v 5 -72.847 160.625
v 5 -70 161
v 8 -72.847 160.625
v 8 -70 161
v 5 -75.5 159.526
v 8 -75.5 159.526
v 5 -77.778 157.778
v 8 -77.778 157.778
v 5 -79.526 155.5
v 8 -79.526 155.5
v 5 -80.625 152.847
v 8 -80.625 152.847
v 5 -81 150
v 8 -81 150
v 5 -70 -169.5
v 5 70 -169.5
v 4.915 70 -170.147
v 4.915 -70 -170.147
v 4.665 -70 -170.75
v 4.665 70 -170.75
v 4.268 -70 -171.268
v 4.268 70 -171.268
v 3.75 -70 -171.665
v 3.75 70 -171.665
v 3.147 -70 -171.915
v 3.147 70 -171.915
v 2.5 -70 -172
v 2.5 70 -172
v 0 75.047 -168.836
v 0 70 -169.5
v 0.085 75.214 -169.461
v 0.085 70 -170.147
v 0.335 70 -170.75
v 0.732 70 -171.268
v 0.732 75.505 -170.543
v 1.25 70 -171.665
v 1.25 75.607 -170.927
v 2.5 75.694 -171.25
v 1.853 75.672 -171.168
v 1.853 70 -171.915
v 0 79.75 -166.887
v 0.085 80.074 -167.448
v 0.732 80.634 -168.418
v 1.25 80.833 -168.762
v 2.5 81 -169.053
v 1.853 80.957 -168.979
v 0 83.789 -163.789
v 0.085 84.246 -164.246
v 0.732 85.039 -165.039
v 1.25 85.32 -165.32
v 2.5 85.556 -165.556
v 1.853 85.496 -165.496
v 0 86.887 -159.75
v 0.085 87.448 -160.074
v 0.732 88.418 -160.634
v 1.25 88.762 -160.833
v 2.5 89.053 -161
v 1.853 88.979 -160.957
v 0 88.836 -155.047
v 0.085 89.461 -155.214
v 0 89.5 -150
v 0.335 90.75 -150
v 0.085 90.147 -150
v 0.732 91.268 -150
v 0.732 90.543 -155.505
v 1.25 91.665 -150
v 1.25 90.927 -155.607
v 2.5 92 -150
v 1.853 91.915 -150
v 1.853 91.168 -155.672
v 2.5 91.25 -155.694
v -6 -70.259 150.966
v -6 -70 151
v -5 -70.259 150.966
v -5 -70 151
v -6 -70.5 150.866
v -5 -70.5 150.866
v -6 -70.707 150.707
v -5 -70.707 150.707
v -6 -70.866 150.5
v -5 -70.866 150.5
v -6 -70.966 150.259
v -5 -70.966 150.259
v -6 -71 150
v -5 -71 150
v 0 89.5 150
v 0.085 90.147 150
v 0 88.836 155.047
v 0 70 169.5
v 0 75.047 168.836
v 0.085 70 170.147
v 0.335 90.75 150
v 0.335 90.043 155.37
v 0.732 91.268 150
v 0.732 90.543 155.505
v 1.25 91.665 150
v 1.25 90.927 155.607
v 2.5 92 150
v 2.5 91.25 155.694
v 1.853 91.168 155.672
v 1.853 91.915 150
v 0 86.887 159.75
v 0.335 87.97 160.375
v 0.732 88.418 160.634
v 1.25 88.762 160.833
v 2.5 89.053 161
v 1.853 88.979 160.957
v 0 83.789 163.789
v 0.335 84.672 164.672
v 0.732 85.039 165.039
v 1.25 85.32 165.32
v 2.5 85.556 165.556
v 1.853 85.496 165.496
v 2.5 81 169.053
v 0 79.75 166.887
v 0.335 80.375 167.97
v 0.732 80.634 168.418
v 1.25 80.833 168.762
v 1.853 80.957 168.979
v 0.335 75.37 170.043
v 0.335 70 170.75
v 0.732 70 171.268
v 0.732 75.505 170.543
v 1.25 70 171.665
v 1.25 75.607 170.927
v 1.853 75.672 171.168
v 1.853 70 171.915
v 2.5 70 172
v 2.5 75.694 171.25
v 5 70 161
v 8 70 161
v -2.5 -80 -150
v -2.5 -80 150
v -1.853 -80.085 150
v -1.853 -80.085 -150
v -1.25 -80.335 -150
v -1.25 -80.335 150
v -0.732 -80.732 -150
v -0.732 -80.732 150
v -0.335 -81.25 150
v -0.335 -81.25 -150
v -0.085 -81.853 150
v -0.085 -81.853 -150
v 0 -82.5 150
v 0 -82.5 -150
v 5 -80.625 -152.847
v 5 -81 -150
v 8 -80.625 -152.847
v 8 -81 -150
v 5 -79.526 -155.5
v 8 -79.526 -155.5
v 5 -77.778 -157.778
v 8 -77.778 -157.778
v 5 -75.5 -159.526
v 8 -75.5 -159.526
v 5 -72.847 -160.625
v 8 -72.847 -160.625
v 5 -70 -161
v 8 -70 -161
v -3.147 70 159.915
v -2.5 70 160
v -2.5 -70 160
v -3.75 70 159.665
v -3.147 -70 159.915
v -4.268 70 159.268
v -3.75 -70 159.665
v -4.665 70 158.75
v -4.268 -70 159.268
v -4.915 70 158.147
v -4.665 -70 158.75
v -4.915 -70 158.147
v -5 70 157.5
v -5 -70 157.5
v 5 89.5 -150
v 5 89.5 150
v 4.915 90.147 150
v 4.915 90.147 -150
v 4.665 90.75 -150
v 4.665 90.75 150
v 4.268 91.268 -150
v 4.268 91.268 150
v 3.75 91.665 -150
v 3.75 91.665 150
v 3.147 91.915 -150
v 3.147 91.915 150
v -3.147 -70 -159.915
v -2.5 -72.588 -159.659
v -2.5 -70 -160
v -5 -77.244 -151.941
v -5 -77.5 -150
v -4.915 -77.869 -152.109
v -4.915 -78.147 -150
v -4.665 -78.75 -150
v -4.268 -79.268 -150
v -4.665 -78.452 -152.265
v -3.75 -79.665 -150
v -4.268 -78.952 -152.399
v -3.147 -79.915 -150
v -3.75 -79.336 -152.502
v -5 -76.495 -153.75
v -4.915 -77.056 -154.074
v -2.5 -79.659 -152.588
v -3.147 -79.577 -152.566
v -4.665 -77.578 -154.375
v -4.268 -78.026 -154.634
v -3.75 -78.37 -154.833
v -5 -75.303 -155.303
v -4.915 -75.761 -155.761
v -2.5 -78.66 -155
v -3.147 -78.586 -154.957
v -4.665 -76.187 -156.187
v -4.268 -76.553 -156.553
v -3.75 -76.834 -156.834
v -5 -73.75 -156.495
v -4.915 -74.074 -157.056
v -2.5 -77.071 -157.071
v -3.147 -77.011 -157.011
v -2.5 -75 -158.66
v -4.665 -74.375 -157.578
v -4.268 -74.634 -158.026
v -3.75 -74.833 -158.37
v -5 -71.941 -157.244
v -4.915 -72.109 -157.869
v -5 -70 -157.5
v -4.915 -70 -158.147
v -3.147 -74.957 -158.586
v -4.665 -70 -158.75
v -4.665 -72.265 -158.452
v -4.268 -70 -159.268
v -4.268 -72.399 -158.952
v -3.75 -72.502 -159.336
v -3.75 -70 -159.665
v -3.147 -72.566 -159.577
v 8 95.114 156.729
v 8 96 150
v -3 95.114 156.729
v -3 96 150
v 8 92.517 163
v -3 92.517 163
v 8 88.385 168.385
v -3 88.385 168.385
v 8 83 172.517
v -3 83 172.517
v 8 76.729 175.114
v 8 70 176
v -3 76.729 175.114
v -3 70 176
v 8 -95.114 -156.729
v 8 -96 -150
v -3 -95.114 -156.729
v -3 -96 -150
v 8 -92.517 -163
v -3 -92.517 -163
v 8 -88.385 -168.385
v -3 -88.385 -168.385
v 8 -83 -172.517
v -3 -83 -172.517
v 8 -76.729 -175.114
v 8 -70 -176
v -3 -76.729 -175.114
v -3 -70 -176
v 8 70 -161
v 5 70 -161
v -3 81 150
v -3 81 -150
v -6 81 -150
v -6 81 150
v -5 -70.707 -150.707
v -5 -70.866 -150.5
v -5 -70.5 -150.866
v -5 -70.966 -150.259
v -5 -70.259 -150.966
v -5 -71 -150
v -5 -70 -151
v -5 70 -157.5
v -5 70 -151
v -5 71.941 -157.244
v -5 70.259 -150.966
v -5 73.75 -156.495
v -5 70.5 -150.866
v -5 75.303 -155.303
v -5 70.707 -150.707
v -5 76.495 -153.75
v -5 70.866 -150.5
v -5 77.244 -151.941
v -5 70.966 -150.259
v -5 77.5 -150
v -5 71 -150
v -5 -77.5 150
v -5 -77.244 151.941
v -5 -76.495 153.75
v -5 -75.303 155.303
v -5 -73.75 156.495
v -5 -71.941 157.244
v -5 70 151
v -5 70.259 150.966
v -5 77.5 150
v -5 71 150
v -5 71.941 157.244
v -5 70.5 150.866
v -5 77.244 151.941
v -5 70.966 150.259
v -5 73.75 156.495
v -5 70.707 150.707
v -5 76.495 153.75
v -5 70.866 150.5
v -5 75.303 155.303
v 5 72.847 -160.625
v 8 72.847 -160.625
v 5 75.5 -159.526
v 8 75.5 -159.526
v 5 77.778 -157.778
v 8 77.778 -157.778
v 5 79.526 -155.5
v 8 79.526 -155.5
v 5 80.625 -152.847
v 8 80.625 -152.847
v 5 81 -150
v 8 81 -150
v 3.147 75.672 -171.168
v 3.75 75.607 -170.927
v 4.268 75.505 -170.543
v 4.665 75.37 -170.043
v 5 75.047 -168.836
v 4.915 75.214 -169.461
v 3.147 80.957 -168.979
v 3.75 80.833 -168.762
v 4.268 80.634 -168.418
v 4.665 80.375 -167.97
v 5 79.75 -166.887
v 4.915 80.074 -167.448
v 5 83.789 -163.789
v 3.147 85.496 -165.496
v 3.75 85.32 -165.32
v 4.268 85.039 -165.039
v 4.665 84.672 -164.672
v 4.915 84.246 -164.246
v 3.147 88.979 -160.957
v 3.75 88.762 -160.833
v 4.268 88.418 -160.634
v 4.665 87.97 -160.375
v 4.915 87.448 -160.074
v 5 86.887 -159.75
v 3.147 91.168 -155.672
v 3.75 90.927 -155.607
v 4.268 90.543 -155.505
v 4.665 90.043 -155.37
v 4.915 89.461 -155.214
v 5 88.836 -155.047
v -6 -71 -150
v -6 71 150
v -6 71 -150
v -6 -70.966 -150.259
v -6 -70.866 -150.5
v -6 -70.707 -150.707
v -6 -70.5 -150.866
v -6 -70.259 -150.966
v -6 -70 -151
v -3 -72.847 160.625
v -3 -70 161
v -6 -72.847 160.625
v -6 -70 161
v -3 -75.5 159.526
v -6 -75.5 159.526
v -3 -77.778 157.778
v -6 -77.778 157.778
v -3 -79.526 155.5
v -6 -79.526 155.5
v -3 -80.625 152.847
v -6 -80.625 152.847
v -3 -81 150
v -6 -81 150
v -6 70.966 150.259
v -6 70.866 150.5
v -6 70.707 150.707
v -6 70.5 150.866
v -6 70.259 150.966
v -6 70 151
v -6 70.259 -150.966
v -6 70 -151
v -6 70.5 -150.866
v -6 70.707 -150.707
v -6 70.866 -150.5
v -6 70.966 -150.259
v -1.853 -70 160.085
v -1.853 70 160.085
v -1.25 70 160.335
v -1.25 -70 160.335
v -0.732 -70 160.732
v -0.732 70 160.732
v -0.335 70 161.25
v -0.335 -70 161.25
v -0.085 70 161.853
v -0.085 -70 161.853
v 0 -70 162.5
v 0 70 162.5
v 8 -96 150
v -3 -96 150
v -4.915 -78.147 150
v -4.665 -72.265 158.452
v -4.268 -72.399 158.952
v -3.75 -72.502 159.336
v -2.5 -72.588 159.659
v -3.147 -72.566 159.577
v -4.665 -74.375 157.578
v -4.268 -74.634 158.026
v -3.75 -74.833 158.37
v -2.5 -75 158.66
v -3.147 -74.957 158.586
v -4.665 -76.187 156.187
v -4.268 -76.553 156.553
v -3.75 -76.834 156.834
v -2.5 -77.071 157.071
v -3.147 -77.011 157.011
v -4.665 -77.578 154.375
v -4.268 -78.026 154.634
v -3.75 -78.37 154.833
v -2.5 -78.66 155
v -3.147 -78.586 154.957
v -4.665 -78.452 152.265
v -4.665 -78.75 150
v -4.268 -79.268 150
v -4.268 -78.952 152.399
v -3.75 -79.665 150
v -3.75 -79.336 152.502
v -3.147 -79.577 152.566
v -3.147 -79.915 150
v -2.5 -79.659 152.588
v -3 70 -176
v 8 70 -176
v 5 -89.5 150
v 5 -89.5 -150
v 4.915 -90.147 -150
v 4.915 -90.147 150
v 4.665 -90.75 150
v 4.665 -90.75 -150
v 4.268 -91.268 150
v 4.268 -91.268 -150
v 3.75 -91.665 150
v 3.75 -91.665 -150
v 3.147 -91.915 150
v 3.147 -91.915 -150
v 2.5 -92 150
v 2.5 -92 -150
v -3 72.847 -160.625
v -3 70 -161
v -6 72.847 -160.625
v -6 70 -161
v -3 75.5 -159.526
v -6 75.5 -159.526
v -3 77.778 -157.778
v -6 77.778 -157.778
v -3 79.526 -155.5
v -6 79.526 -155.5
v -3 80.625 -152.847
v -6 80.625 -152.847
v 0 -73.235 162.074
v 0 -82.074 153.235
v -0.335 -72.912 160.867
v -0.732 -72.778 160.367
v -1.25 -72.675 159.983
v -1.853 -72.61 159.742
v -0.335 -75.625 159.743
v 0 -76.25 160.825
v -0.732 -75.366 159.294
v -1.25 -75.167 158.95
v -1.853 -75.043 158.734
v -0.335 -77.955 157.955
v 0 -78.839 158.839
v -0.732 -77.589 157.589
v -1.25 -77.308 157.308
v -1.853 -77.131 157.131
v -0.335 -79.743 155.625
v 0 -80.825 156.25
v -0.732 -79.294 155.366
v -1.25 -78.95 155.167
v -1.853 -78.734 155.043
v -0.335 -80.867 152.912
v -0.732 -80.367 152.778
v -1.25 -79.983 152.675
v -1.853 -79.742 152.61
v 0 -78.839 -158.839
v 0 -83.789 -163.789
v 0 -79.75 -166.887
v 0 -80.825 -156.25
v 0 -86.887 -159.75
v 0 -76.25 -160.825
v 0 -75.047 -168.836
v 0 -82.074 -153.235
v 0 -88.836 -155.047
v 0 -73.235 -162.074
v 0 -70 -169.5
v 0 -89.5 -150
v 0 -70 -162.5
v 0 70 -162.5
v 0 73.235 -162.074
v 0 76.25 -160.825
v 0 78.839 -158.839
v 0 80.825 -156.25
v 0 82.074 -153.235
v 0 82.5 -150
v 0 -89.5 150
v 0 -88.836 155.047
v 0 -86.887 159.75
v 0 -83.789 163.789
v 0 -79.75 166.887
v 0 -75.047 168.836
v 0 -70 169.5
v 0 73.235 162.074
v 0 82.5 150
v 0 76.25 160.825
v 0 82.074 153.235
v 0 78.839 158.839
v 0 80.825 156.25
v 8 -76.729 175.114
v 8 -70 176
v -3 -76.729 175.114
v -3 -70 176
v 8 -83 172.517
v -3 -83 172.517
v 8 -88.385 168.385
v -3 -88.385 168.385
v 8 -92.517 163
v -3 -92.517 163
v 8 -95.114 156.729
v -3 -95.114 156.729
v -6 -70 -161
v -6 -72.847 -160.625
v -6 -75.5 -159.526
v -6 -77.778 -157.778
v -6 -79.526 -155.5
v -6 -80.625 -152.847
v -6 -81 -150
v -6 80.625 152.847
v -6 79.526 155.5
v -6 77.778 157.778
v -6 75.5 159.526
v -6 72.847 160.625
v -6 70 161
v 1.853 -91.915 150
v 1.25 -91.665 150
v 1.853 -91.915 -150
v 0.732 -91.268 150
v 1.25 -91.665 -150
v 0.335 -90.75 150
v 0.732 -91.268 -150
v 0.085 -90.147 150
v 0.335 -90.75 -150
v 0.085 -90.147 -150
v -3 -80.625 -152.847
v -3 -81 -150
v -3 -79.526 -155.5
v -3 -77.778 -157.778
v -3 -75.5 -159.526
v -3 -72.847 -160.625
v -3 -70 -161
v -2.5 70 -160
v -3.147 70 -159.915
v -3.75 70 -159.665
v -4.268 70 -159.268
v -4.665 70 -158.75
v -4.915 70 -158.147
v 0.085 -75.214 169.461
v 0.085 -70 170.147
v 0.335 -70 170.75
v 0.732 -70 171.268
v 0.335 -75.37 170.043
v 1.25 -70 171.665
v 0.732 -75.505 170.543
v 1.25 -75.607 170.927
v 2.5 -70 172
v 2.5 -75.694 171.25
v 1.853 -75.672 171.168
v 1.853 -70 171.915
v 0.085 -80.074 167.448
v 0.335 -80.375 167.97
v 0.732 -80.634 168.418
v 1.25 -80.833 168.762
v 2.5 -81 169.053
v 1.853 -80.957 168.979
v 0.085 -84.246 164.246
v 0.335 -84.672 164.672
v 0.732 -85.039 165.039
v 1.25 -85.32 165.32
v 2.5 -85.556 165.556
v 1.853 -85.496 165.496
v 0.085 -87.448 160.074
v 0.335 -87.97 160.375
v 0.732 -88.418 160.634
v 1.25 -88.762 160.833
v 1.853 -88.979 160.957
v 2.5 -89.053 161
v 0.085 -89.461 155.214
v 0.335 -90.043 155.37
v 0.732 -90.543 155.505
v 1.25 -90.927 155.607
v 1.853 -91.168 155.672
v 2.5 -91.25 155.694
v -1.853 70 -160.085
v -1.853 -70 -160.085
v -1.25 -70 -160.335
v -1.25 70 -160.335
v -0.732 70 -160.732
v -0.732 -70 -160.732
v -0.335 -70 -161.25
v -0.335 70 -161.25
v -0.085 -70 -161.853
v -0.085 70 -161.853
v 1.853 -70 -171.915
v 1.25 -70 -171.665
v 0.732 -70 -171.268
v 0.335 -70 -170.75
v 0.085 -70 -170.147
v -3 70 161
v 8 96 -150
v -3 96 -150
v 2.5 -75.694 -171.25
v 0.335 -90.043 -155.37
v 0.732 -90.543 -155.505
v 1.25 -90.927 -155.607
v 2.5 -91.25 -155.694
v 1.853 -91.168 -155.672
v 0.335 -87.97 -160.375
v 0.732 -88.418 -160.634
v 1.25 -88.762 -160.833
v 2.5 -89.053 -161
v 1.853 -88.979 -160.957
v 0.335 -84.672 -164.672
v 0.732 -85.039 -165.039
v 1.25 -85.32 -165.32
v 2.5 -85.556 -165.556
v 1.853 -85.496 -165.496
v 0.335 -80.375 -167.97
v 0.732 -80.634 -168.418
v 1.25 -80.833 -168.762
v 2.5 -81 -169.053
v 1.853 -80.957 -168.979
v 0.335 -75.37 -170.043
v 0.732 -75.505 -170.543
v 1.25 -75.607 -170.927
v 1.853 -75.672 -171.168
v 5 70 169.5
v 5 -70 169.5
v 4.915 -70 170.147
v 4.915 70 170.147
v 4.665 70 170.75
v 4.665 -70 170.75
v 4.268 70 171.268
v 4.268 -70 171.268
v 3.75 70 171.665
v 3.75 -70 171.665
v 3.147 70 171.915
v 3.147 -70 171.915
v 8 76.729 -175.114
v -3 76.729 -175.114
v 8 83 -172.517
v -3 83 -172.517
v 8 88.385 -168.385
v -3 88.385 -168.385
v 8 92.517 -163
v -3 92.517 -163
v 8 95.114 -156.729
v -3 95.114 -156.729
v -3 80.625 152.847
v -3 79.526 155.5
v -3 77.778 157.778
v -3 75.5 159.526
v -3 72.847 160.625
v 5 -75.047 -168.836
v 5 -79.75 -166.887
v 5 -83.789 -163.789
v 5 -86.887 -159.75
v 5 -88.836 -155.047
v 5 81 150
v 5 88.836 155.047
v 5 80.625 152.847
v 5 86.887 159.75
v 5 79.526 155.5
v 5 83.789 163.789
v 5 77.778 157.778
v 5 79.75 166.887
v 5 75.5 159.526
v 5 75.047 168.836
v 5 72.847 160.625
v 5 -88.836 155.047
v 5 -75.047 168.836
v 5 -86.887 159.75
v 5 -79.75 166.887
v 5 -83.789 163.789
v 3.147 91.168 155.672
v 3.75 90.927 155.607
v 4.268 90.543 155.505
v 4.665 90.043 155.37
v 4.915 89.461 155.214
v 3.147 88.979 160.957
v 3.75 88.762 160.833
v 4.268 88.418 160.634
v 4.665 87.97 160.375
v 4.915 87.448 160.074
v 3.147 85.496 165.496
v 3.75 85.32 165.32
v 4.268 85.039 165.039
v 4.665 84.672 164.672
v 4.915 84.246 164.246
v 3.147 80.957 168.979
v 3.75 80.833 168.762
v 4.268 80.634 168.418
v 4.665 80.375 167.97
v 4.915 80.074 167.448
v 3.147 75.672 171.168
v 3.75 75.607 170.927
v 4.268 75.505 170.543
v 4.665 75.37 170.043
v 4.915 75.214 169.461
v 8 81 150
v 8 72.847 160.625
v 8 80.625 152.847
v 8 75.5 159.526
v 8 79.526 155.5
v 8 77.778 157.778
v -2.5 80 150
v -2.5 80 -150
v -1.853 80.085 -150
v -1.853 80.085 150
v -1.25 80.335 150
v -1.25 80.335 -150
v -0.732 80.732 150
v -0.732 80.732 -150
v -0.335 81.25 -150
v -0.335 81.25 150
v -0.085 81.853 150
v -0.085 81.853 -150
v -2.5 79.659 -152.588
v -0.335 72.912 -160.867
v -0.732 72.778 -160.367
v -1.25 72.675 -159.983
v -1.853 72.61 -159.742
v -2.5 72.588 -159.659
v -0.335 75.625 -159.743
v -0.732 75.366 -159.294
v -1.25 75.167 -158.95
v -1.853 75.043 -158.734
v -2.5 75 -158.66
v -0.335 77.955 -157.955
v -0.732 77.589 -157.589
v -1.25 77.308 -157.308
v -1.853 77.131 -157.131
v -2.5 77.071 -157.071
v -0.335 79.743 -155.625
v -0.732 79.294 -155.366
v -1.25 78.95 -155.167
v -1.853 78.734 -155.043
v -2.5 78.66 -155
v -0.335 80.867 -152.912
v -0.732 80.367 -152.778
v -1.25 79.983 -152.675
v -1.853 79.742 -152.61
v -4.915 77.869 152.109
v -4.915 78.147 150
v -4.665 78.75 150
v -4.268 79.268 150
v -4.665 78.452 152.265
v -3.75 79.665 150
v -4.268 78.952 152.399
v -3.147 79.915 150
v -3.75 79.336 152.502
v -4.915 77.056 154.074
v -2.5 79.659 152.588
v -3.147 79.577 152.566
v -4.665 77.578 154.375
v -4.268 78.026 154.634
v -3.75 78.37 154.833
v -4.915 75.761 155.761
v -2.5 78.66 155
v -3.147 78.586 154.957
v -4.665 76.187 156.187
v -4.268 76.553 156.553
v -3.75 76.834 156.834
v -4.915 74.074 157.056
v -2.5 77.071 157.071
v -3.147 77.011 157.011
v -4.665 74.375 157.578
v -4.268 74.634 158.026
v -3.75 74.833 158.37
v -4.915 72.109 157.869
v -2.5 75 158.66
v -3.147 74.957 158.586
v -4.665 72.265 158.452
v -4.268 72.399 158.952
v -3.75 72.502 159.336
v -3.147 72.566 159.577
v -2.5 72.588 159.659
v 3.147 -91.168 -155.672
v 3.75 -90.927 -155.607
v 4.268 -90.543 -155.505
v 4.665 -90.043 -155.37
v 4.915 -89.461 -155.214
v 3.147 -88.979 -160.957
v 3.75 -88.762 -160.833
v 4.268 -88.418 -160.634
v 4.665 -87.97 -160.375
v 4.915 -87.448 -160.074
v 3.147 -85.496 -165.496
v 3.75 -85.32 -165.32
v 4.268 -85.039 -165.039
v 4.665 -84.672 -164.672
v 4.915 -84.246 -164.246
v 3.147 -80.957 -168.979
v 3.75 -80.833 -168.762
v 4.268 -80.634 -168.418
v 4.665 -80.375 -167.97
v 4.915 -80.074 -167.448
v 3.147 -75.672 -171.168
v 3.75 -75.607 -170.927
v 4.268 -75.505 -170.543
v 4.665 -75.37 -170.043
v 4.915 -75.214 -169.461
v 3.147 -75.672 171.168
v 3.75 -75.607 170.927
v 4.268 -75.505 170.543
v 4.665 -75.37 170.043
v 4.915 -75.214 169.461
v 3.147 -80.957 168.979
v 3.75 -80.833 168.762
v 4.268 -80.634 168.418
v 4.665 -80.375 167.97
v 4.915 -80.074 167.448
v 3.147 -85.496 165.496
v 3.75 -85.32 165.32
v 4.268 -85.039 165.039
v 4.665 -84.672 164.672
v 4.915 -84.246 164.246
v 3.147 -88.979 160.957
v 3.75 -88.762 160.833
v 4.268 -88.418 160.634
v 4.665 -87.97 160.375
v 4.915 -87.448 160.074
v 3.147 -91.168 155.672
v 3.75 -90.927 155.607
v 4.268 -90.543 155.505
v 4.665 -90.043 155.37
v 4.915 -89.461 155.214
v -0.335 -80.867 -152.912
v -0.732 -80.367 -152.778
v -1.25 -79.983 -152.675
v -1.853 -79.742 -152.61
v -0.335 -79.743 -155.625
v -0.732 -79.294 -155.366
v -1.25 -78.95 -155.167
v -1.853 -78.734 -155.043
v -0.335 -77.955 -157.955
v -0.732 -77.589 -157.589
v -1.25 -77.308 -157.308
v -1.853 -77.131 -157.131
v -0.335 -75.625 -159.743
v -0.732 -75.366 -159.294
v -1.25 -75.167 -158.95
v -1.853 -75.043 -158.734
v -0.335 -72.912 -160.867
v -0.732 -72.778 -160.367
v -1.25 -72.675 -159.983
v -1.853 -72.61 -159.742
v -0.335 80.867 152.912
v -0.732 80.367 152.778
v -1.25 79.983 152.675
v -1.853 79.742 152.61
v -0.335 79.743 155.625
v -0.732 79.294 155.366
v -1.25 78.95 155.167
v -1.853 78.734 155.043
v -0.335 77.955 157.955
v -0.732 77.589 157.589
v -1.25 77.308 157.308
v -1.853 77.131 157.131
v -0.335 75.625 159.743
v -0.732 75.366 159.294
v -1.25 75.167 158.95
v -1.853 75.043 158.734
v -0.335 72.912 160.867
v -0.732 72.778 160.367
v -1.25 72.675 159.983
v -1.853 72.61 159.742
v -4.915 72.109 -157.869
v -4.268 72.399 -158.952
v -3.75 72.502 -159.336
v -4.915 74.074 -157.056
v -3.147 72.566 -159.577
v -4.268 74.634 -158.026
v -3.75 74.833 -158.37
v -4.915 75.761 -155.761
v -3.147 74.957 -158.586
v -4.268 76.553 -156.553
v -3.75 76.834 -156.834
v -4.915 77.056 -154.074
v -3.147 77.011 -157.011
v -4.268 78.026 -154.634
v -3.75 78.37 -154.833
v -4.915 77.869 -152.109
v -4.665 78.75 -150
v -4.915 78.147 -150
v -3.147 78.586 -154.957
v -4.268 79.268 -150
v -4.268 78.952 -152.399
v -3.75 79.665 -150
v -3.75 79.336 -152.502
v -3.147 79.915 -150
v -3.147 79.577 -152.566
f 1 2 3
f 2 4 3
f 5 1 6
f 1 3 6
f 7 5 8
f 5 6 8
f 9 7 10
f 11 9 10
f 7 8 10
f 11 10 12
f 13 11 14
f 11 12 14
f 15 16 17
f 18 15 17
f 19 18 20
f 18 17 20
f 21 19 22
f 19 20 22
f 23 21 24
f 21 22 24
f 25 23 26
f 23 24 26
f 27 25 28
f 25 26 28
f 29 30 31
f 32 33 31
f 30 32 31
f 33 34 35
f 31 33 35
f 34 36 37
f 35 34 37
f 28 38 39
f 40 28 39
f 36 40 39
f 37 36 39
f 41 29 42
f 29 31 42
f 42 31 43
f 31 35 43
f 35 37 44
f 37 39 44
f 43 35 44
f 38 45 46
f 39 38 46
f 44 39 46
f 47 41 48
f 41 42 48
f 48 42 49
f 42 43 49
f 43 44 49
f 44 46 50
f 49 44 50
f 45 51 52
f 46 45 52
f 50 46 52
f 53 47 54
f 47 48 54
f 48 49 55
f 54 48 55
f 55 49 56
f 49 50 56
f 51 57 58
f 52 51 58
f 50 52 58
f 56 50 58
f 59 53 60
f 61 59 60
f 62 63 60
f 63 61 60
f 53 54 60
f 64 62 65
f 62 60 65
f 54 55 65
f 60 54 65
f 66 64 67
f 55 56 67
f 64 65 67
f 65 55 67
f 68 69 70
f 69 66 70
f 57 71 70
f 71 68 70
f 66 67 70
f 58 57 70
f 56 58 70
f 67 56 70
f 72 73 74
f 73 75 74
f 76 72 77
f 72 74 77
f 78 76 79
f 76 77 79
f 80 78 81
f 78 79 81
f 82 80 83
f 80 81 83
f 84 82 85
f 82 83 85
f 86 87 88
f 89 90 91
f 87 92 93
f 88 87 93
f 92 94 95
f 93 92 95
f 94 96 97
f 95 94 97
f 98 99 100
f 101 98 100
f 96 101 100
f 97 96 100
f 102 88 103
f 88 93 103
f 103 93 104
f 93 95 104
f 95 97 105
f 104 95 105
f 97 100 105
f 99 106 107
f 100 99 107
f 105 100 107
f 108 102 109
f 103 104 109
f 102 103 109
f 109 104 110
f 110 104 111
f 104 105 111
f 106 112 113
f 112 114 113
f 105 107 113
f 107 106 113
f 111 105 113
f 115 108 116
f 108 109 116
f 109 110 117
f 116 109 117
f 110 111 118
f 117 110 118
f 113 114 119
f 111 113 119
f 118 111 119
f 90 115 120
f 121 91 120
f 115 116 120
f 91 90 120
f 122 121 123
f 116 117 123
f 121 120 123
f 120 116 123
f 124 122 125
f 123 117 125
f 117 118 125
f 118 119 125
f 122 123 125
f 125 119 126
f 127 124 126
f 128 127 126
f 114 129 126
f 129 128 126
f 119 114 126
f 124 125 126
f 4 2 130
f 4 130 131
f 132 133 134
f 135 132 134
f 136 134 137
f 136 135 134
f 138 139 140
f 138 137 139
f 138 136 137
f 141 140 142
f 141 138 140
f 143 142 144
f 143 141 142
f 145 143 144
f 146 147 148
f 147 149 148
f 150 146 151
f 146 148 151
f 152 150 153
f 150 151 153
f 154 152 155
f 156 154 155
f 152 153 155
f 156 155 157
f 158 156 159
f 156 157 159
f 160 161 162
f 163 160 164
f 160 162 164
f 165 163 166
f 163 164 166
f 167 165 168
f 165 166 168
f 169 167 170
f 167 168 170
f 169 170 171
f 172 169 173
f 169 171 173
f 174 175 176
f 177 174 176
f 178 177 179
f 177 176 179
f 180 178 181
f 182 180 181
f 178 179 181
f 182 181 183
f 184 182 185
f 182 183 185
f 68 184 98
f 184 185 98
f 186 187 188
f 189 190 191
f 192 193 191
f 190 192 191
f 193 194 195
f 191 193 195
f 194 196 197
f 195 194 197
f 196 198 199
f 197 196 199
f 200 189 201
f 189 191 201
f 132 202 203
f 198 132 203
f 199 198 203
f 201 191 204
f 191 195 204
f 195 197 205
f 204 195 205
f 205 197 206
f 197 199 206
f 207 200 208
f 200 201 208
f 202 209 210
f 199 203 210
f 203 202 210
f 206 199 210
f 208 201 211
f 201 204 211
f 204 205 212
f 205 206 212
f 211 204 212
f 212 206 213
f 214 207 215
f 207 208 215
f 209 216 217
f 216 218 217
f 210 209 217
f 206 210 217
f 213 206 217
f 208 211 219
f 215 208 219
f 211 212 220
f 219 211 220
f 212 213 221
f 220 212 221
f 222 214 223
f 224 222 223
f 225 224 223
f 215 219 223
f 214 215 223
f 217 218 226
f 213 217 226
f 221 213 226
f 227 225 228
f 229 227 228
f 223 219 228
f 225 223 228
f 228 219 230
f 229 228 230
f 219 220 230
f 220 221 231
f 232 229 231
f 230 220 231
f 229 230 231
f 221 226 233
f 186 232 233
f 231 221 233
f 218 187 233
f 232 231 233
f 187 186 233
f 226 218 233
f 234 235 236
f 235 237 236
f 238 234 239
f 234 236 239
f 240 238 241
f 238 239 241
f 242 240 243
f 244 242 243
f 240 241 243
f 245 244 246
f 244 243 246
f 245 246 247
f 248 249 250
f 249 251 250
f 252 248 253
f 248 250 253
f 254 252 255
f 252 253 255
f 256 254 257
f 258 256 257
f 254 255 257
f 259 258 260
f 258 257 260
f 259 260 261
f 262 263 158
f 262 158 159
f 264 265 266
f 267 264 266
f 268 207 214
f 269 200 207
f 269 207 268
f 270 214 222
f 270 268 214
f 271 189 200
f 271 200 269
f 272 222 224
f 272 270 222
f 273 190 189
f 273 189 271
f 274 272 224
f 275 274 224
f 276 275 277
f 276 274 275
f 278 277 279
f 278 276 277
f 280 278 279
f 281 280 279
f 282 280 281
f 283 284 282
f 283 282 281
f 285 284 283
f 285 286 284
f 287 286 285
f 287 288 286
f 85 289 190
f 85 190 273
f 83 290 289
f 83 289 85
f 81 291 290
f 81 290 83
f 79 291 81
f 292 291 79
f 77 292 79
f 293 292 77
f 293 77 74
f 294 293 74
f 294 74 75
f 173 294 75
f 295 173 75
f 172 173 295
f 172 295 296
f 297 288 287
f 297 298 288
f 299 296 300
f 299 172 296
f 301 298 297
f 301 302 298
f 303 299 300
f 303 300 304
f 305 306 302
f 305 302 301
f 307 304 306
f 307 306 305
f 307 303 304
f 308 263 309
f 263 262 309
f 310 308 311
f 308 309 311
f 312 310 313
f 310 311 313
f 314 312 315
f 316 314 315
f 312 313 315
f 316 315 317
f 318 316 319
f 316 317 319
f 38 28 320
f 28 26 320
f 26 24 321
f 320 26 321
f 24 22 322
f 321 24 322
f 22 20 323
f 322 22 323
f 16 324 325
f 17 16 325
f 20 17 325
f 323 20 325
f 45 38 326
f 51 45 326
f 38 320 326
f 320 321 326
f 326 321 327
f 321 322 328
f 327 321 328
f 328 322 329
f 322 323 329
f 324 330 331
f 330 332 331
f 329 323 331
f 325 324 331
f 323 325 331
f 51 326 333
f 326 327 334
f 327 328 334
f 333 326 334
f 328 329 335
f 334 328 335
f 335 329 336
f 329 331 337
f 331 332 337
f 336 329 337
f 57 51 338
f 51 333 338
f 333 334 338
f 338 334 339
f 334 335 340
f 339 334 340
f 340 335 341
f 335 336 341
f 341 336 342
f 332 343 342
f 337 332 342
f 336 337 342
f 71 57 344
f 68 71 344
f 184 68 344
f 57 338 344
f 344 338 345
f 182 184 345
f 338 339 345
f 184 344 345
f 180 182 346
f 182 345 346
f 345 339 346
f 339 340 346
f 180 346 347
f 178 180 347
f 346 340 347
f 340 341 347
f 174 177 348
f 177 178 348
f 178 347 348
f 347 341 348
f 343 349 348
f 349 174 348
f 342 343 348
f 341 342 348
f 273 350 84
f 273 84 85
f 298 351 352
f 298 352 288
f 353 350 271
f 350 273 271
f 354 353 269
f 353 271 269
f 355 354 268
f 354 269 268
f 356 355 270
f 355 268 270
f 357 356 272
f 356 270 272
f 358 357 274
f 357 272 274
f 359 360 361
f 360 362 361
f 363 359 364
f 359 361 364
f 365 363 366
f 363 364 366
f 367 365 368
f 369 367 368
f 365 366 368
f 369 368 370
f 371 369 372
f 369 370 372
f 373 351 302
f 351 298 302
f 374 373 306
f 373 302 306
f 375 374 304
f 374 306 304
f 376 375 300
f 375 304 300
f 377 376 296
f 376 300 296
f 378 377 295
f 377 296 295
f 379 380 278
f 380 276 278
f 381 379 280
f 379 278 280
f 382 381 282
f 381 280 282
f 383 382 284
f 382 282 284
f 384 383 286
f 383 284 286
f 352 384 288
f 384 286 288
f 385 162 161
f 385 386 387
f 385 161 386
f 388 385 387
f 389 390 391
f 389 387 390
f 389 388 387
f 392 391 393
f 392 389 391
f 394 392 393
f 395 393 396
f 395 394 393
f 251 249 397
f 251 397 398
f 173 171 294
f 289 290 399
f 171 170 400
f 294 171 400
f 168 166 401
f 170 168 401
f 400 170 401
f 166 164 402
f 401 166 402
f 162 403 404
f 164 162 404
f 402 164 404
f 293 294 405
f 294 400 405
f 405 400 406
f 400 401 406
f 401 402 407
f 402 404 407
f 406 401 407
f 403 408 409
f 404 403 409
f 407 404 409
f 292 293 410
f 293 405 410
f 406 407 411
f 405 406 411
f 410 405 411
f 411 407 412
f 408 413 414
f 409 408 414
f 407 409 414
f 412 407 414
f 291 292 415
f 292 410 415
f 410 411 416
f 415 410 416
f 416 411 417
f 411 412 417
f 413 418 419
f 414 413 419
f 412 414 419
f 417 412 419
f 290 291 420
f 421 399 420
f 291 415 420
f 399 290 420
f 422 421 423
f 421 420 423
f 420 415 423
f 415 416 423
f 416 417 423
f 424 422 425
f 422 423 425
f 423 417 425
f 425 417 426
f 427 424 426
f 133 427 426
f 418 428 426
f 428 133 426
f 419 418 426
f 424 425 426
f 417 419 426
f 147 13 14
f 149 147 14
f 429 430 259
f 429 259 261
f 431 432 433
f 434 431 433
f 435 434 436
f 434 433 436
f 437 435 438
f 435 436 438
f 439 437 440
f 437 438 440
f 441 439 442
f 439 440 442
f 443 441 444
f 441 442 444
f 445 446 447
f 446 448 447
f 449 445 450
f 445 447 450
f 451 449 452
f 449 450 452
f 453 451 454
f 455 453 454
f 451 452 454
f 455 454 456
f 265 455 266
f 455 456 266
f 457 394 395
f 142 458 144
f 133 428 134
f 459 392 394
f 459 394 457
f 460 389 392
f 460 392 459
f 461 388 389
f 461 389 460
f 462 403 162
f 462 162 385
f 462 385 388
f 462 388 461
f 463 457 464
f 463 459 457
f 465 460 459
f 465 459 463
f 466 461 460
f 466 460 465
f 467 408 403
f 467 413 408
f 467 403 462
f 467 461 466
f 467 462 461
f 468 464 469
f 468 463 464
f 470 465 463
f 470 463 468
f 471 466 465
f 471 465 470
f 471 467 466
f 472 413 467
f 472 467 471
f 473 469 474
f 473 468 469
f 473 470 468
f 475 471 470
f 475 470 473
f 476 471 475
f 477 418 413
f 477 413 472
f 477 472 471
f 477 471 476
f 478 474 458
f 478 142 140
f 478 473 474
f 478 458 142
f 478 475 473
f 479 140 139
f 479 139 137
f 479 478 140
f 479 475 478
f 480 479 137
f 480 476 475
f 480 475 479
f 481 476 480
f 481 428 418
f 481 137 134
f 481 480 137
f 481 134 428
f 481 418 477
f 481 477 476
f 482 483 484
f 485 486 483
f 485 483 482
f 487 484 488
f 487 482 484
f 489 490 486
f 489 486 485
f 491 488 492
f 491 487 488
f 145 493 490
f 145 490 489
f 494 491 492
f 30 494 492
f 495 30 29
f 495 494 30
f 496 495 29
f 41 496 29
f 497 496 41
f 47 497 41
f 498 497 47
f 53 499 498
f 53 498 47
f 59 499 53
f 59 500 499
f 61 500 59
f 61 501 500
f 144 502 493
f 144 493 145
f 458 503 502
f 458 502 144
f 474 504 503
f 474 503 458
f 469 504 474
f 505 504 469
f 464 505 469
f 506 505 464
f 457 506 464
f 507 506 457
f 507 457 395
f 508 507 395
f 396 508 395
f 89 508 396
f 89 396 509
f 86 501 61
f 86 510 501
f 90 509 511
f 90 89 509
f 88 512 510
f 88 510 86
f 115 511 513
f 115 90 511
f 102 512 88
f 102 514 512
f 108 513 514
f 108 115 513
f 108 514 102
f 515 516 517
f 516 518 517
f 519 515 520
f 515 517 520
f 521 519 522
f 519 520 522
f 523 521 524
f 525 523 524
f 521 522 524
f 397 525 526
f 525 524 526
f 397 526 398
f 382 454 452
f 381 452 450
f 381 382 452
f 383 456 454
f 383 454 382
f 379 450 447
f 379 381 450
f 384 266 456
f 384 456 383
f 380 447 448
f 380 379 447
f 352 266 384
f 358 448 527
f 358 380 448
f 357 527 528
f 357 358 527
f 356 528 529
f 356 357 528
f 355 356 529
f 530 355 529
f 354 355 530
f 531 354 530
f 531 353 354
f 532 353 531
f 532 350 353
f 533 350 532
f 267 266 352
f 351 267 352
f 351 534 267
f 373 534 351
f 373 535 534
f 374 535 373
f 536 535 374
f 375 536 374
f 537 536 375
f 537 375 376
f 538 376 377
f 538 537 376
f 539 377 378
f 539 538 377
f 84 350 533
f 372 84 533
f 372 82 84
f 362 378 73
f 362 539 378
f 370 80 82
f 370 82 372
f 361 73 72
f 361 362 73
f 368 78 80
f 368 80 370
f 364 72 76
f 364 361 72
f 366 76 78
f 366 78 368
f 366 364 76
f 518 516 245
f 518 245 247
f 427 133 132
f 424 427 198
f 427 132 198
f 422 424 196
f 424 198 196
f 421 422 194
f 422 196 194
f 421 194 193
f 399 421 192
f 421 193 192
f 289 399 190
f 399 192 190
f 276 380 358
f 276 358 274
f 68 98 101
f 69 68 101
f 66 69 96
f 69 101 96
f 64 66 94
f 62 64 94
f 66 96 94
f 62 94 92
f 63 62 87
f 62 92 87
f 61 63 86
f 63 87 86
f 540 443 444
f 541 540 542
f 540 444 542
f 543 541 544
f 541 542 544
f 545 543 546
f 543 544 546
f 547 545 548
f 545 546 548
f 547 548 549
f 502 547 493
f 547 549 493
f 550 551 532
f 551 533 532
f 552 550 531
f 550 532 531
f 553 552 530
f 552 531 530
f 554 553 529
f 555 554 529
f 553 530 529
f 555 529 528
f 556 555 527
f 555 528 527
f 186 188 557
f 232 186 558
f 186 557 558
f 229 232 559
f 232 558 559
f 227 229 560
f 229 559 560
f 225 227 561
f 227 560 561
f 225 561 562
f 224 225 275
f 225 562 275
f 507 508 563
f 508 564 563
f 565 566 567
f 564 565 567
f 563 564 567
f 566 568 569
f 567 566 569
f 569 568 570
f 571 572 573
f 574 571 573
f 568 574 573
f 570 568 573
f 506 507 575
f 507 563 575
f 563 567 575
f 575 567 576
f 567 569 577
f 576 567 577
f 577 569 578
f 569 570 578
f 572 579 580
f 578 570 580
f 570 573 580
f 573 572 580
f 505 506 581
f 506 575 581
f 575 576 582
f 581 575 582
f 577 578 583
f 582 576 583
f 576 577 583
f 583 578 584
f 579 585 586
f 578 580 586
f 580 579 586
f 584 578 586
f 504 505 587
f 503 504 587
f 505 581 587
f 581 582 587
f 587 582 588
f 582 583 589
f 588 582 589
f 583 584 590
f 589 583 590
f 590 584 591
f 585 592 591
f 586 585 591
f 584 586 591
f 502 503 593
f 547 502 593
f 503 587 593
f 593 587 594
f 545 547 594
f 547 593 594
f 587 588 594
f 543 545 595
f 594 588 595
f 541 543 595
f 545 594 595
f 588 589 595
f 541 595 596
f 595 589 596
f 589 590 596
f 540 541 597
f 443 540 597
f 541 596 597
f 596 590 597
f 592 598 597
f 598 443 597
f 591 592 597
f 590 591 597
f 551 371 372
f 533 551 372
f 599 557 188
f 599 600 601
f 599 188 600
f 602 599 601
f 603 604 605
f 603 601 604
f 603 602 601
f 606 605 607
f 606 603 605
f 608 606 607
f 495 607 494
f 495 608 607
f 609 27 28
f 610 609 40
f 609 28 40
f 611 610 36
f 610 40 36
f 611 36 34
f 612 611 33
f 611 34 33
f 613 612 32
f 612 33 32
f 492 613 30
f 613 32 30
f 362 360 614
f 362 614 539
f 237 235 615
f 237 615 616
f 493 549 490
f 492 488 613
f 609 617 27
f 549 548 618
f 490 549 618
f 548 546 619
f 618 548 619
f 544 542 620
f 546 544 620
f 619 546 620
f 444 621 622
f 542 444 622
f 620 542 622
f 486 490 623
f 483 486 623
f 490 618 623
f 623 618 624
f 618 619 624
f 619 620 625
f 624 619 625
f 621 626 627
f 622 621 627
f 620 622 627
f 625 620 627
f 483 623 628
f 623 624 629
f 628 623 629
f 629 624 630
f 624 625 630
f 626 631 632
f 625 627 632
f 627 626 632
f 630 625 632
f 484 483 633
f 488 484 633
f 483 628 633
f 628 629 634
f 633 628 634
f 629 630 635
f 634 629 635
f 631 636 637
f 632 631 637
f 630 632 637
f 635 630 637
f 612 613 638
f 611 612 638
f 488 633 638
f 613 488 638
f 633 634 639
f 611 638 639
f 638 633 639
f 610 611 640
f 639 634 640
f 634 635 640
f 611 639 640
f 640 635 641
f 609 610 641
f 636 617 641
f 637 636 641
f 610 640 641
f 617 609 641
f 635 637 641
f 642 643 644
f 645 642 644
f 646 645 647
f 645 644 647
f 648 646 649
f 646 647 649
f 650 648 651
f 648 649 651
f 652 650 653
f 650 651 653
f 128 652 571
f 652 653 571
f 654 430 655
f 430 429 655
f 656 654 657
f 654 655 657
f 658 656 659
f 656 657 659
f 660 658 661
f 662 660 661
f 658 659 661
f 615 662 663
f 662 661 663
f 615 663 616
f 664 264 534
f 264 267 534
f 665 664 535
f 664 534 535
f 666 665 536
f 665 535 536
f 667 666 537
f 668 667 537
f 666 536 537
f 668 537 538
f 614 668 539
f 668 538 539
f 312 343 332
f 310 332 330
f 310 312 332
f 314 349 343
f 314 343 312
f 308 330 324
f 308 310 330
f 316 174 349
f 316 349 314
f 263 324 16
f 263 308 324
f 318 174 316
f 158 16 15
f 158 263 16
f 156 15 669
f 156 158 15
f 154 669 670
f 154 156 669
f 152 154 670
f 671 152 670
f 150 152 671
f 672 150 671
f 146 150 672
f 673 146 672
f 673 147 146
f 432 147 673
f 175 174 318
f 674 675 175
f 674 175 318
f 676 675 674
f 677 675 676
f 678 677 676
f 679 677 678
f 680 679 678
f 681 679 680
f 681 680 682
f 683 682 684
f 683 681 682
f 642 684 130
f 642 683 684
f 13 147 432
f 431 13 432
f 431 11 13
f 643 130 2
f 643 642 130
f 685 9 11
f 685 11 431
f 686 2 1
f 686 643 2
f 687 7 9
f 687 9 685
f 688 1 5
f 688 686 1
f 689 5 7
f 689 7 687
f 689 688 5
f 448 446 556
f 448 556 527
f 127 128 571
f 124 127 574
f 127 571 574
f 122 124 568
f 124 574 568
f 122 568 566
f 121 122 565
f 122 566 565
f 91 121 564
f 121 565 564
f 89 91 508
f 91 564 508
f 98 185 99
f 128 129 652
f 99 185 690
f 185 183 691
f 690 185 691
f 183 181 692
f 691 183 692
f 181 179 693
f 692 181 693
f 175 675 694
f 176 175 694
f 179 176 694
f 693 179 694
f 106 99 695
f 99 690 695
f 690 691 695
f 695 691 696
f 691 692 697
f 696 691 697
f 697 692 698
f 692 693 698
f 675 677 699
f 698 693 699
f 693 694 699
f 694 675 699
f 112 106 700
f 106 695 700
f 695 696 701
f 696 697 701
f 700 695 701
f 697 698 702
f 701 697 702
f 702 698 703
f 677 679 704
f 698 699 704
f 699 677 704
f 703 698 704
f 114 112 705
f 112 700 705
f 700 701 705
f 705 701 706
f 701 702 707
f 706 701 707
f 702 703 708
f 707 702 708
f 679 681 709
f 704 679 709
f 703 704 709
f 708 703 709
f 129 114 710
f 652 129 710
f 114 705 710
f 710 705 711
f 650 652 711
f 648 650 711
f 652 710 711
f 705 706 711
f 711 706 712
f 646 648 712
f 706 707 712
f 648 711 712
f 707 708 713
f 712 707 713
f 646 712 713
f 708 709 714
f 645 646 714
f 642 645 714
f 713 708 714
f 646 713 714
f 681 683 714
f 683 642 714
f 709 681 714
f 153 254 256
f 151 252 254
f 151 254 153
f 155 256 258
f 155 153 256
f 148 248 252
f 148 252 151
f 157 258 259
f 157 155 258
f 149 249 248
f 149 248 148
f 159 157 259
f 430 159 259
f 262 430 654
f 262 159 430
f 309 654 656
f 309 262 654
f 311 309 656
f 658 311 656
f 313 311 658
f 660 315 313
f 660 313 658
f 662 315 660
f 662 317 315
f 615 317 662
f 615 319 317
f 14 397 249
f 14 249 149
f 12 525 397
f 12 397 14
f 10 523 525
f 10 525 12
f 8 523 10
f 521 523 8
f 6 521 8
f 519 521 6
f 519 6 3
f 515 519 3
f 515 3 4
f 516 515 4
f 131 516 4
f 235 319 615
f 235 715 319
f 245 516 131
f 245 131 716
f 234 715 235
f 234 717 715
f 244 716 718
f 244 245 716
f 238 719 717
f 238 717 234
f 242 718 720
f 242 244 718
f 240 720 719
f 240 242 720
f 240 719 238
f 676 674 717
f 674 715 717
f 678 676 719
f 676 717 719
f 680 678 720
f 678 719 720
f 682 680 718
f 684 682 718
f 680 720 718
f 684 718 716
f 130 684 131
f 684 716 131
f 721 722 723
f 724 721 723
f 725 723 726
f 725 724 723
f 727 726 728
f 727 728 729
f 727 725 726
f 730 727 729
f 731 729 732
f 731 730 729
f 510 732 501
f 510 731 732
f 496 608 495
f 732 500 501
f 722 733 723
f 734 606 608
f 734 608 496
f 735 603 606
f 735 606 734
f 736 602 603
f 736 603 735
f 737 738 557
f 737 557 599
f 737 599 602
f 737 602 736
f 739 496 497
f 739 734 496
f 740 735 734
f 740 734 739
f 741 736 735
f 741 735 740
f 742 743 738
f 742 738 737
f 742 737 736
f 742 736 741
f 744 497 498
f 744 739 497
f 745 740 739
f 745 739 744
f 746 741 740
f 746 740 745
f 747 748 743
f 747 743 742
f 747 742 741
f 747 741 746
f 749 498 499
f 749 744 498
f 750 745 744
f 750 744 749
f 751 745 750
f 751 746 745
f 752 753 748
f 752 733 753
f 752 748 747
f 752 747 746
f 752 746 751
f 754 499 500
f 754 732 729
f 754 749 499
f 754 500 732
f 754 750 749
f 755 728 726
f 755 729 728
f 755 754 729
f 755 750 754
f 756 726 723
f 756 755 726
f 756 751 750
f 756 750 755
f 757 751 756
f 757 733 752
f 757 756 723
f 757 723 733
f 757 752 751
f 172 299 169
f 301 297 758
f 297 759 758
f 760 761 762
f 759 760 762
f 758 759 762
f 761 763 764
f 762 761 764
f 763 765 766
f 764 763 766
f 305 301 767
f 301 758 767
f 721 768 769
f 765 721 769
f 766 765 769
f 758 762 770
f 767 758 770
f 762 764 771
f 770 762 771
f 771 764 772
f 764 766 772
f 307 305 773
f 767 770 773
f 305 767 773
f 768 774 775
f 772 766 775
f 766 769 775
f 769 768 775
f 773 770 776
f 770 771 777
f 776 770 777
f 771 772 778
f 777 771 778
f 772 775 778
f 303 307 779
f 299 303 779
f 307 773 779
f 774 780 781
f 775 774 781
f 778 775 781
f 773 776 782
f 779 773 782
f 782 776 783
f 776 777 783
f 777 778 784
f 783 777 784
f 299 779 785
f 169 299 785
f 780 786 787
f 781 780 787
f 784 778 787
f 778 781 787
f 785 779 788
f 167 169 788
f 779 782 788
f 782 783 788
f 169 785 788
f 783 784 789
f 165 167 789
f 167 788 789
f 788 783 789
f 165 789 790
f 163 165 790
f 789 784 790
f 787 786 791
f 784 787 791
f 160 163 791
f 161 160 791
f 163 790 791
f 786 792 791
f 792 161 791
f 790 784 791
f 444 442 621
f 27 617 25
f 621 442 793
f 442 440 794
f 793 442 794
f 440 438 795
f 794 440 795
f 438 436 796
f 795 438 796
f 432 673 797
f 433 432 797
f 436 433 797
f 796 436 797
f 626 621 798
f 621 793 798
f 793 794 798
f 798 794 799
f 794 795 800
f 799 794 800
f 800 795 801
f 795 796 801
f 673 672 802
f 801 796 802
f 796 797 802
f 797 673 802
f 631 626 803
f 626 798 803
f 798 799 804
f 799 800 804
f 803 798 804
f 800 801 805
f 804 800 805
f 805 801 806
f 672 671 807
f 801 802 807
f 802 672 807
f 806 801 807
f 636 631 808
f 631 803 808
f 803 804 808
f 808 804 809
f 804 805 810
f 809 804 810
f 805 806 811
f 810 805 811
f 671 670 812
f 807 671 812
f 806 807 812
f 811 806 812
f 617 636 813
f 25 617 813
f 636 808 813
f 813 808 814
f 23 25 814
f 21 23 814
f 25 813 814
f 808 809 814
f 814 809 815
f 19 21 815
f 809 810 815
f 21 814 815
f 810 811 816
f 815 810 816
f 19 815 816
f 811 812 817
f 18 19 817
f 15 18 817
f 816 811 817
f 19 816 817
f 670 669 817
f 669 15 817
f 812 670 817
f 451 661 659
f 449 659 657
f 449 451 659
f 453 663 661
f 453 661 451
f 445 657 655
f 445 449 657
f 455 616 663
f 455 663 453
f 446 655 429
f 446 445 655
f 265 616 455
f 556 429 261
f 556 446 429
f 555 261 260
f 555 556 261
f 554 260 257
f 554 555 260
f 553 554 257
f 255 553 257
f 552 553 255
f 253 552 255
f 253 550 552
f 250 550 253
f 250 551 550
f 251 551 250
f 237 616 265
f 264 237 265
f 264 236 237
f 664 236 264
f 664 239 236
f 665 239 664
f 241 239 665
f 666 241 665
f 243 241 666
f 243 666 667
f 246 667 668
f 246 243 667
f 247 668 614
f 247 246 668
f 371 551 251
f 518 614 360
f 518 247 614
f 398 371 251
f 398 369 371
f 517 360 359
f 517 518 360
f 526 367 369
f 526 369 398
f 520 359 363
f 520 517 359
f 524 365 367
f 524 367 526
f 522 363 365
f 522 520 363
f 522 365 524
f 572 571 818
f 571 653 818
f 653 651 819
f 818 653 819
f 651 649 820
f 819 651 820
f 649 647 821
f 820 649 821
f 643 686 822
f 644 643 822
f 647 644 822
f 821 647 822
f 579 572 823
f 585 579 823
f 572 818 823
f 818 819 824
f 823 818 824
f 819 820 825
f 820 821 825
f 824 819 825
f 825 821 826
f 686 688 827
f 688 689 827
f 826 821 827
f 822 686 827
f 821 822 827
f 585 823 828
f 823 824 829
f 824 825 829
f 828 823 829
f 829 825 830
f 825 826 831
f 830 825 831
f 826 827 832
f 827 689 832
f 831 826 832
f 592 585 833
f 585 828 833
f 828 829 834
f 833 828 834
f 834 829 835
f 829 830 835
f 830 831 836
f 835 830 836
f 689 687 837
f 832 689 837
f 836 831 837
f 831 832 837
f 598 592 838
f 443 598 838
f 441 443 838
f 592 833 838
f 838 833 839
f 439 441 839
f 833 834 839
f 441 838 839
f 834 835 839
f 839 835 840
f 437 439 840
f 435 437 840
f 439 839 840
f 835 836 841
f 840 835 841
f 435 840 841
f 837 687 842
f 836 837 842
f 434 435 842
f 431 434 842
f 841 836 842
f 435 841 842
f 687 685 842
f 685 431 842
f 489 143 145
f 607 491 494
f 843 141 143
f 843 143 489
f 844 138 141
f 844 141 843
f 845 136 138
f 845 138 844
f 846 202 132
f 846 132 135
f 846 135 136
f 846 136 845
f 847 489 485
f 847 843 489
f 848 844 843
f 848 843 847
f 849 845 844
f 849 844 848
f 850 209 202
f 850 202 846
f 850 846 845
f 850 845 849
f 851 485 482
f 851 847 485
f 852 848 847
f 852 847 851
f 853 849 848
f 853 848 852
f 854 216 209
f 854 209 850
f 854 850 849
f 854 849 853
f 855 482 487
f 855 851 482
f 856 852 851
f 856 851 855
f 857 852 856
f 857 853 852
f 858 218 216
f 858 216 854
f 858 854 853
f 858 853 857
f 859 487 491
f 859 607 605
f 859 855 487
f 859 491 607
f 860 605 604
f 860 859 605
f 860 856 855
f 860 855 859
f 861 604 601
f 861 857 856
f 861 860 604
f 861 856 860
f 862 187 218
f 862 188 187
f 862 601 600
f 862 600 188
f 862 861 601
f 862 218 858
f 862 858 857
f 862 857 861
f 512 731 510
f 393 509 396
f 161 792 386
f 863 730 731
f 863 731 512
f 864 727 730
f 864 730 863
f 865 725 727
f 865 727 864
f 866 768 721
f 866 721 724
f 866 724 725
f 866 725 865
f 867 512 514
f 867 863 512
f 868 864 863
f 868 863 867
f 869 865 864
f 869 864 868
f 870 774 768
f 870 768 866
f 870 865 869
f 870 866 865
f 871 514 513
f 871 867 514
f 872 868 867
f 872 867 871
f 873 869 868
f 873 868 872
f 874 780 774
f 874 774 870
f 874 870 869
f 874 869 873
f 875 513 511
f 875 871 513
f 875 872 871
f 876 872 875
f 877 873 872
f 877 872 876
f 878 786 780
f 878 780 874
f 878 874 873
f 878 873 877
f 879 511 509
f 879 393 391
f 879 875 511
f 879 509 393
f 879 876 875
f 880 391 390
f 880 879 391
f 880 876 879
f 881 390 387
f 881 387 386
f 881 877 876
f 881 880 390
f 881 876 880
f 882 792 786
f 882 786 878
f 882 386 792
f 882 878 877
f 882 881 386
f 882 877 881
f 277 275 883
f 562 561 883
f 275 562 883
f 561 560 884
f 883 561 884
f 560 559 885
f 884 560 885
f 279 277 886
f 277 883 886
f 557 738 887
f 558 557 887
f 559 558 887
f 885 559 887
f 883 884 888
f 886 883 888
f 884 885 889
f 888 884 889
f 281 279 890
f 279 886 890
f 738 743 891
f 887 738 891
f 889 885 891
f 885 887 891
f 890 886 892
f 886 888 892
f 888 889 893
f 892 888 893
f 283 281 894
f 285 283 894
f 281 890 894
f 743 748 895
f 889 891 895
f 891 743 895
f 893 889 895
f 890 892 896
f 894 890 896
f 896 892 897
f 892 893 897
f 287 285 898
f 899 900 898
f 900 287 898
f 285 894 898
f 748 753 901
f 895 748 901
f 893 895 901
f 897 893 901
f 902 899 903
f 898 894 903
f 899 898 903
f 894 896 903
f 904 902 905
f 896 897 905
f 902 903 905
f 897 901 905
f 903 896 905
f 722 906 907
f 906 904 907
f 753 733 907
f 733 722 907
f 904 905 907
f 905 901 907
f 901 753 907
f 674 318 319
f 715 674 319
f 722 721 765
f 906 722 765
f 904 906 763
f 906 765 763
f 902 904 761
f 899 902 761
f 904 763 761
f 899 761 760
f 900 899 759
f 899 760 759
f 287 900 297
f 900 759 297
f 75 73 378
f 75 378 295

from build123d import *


with BuildPart() as part:
    # Sweep1: sweep along a path in Sketch2
    with BuildLine(Plane(origin=(2.5, 0, 0), x_dir=(0, 0, -1), z_dir=(1, 0, 0))) as sweep1_path:
        Line((150, 92), (-150, 92))
        ThreePointArc((-150, 92), (-165.556349186, 85.556349186), (-172, 70))
        Line((-172, 70), (-172, -70))
        ThreePointArc((-172, -70), (-165.556349186, -85.556349186), (-150, -92))
        Line((-150, -92), (150, -92))
        ThreePointArc((150, -92), (165.556349186, -85.556349186), (172, -70))
        Line((172, -70), (172, 70))
        ThreePointArc((172, 70), (165.556349186, 85.556349186), (150, 92))
    # Sketch1 → Sweep1 (sweep)
    with BuildSketch(Plane.XY):
        with BuildLine():
            Line((5, 81), (5, 89.5))
            ThreePointArc((5, 89.5), (4.267766953, 91.267766953), (2.5, 92))
            ThreePointArc((2.5, 92), (0.732233047, 91.267766953), (0, 89.5))
            Line((0, 89.5), (0, 82.5))
            ThreePointArc((0, 82.5), (-0.732233047, 80.732233047), (-2.5, 80))
            ThreePointArc((-2.5, 80), (-4.267766953, 79.267766953), (-5, 77.5))
            Line((-5, 77.5), (-5, 71))
            Line((-5, 71), (-6, 71))
            Line((-6, 71), (-6, 81))
            Line((-6, 81), (-3, 81))
            Line((-3, 81), (-3, 96))
            Line((-3, 96), (8, 96))
            Line((8, 96), (8, 81))
            Line((8, 81), (5, 81))
        make_face()
    sweep(path=sweep1_path.line)


solid = part.part
